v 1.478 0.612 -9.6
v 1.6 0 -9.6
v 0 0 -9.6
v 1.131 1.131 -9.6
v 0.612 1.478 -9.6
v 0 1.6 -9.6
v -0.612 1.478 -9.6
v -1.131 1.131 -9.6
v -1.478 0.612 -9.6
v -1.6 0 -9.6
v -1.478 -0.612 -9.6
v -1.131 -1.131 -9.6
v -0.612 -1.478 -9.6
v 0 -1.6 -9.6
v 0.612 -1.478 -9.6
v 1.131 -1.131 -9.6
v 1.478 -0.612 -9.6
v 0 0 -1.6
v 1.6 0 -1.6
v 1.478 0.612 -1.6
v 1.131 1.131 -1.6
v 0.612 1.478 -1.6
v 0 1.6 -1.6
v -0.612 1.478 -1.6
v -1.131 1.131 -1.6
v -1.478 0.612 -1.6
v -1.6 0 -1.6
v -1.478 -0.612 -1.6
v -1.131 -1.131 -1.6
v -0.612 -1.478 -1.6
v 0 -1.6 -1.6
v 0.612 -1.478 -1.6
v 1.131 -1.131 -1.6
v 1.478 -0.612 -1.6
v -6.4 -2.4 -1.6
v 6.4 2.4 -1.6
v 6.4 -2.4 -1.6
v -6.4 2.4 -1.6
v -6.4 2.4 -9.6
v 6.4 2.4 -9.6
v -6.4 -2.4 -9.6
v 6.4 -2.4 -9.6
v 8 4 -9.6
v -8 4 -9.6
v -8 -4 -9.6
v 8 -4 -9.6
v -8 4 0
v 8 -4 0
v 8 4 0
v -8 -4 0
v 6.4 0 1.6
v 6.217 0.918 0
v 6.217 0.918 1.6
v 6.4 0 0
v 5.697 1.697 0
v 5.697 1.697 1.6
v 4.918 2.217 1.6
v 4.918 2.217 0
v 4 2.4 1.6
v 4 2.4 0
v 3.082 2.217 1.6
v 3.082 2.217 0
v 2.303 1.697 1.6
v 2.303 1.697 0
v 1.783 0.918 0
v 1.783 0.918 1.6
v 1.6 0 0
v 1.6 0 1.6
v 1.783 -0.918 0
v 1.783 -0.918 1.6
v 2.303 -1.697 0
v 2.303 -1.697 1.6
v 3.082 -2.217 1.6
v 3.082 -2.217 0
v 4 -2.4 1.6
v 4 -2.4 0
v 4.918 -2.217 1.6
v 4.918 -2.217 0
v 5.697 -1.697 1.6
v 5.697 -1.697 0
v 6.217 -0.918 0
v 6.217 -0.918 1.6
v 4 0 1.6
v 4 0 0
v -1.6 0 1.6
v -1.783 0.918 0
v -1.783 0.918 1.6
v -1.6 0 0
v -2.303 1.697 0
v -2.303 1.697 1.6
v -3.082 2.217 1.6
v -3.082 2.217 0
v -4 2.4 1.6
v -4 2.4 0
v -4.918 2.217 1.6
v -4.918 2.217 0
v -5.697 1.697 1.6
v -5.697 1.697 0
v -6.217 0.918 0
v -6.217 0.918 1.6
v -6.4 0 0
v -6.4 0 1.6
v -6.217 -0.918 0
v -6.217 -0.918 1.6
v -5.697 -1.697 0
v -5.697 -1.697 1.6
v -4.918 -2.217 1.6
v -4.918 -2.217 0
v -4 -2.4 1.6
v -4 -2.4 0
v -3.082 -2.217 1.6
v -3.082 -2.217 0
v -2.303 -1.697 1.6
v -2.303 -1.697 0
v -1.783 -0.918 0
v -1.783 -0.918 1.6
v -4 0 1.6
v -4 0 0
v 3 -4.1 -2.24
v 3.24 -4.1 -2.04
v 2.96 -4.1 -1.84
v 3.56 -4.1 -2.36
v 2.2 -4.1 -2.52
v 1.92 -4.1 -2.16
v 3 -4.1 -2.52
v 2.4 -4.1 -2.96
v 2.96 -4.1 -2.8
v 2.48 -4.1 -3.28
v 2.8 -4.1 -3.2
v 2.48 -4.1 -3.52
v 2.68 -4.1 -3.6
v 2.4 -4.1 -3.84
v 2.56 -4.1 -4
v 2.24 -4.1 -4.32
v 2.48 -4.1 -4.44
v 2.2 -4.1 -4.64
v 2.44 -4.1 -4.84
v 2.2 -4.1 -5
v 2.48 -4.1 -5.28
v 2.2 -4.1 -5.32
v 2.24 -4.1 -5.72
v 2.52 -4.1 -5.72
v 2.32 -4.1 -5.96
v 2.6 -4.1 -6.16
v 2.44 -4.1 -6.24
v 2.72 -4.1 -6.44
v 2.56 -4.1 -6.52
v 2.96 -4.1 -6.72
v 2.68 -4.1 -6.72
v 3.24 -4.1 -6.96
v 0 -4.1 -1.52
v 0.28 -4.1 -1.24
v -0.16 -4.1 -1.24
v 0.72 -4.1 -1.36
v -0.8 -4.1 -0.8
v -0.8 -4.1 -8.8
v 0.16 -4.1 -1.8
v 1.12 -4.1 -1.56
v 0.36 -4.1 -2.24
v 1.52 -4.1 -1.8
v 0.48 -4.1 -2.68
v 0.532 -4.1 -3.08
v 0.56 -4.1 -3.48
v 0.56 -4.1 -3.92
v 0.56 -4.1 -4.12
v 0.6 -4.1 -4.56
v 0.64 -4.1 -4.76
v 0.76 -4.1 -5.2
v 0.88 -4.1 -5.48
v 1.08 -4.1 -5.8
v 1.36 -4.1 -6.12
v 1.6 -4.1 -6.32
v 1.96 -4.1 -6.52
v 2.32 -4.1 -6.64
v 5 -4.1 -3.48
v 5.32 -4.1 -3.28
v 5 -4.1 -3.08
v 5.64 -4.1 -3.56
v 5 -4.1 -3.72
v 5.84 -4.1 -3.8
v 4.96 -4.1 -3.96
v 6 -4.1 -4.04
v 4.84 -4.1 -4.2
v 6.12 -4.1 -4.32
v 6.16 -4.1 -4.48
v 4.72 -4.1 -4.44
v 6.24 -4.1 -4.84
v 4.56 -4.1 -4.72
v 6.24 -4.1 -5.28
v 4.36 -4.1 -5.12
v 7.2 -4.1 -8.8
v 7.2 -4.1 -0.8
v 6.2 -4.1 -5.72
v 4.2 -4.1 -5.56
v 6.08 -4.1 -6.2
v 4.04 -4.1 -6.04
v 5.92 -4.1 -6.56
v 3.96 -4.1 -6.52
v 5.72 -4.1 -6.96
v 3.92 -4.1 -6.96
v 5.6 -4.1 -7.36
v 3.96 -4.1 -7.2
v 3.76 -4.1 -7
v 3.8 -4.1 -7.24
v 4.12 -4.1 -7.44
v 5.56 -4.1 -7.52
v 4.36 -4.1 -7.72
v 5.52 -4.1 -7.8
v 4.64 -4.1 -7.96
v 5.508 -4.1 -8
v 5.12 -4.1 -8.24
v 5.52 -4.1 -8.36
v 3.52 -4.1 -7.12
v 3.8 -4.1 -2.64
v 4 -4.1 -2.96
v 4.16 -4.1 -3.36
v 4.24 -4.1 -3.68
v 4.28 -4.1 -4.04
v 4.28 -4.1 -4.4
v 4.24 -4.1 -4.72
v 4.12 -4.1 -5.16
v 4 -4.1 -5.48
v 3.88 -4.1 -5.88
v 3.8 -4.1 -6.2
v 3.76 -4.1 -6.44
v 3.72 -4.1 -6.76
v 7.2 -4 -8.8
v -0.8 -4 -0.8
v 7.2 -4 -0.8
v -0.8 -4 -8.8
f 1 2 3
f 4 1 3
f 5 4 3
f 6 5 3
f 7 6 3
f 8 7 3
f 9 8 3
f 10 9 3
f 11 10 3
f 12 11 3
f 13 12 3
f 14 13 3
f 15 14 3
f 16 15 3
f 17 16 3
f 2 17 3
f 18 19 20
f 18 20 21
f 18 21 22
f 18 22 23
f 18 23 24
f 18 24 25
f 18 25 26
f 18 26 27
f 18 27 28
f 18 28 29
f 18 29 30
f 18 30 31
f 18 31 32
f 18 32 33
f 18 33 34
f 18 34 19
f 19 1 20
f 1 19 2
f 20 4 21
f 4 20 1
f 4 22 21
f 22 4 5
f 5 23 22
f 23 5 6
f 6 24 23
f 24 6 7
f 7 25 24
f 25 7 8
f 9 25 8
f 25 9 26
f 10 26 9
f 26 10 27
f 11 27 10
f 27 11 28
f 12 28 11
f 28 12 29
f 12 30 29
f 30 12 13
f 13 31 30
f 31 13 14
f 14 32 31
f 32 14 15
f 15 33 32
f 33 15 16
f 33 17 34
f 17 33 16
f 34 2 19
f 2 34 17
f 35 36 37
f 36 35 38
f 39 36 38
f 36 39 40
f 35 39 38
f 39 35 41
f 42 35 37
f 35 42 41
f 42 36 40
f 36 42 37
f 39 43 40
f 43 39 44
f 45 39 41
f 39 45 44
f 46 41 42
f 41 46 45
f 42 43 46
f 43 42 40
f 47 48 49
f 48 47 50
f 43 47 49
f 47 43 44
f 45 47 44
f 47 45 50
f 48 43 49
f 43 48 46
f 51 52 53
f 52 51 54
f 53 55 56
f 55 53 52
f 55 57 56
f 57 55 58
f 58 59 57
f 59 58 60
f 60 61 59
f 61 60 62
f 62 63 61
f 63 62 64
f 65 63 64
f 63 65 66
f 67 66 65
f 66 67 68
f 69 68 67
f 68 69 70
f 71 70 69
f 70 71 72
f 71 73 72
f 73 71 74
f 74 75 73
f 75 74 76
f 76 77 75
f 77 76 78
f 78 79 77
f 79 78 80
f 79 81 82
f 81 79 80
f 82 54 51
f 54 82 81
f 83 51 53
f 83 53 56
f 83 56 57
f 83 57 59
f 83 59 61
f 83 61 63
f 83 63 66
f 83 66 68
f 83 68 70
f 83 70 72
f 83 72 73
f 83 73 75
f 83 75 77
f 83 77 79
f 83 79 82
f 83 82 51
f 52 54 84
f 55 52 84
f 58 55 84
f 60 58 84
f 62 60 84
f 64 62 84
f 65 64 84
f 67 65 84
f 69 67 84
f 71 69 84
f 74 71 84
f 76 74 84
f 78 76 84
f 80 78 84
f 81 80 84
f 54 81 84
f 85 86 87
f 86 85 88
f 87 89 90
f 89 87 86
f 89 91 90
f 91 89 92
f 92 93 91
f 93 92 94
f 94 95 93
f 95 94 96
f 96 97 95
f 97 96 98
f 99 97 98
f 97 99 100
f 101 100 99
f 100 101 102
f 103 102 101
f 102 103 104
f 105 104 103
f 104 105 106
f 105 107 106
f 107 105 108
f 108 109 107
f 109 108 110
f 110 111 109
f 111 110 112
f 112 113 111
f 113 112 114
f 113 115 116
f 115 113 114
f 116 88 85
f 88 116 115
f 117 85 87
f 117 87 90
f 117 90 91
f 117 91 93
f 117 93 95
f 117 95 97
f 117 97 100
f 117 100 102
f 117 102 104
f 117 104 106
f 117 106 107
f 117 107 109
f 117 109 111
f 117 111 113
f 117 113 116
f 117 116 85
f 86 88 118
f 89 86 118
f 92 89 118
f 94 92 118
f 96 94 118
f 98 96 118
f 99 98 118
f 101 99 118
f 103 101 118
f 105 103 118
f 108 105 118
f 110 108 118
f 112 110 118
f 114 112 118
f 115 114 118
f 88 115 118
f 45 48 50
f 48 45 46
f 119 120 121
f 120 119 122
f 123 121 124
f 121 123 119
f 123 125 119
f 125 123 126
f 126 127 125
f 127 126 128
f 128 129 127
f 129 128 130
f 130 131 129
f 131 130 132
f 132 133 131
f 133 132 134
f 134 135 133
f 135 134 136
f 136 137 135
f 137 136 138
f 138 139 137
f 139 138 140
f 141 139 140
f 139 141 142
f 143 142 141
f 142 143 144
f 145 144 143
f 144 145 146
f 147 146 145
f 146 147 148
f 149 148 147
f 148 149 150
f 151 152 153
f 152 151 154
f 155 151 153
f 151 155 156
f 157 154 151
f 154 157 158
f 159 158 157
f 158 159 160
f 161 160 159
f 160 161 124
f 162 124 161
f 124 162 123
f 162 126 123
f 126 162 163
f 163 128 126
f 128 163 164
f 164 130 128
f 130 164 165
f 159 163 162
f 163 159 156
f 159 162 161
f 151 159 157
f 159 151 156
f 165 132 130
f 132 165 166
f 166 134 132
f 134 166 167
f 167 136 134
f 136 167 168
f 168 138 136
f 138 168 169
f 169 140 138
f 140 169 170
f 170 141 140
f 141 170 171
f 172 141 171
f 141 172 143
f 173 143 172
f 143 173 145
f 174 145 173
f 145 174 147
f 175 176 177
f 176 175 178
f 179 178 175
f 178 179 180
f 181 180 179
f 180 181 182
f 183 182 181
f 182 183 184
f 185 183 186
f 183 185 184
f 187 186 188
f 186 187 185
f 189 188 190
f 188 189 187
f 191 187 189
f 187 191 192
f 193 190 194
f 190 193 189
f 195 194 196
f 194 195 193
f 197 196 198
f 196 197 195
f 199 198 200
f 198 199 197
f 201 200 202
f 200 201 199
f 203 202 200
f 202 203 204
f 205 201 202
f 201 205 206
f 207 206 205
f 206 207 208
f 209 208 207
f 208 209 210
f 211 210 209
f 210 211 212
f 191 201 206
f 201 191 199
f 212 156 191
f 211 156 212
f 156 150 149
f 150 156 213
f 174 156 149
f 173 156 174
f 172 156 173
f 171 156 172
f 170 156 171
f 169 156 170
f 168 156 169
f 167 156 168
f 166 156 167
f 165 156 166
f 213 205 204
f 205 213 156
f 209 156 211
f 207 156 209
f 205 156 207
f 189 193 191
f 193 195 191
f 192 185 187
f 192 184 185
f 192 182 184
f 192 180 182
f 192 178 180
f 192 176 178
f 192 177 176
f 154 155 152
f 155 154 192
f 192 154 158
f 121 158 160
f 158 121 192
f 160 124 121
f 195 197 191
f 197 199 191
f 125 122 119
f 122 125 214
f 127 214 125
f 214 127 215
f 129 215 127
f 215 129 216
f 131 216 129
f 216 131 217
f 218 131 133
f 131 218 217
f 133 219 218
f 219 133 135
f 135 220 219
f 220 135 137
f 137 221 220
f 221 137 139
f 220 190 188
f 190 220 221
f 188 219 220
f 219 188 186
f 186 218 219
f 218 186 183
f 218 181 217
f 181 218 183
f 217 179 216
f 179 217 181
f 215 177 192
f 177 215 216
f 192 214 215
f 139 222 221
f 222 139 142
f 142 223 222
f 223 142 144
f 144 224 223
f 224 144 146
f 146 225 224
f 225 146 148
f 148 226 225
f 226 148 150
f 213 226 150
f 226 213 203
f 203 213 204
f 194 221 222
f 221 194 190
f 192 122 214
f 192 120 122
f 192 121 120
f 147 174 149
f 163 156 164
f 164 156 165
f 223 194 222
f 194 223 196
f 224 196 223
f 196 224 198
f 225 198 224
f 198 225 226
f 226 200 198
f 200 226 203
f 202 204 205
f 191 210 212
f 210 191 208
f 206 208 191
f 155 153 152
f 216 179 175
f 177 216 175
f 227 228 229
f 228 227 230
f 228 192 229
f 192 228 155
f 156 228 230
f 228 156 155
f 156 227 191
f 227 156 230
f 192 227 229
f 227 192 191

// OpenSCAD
// file: ../p/4-4edge.scad
use <../lib.scad>
function ldraw_lib__4_4edge() = [
// 0 Circle 1.0
// 0 Name: 4-4edge.dat
// 0 Author: James Jessiman
// 0 !LDRAW_ORG Primitive UPDATE 2017-01
// 0 !LICENSE Licensed under CC BY 2.0 and CC BY 4.0 : see CAreadme.txt
// 
// 0 BFC CERTIFY CCW
  [0,"BFC","CERTIFY"],
  [0,"BFC","CCW"],
// 
// 0 !HISTORY 1998-12-15 [PTadmin] Official Update 1998-10
// 0 !HISTORY 2005-12-28 [PTadmin] Official Update 2005-01
// 0 !HISTORY 2007-06-24 [PTadmin] Header formatted for Contributor Agreement
// 0 !HISTORY 2008-07-01 [PTadmin] Official Update 2008-01
// 0 !HISTORY 2017-01-15 [Steffen] BFCed
// 0 !HISTORY 2017-12-30 [PTadmin] Official Update 2017-01
// 
// 
// 2 24 1 0 0 0.9239 0 0.3827
  [2,24,1,0,0,0.9239,0,0.3827],
// 2 24 0.9239 0 0.3827 0.7071 0 0.7071
  [2,24,0.9239,0,0.3827,0.7071,0,0.7071],
// 2 24 0.7071 0 0.7071 0.3827 0 0.9239
  [2,24,0.7071,0,0.7071,0.3827,0,0.9239],
// 2 24 0.3827 0 0.9239 0 0 1
  [2,24,0.3827,0,0.9239,0,0,1],
// 2 24 0 0 1 -0.3827 0 0.9239
  [2,24,0,0,1,-0.3827,0,0.9239],
// 2 24 -0.3827 0 0.9239 -0.7071 0 0.7071
  [2,24,-0.3827,0,0.9239,-0.7071,0,0.7071],
// 2 24 -0.7071 0 0.7071 -0.9239 0 0.3827
  [2,24,-0.7071,0,0.7071,-0.9239,0,0.3827],
// 2 24 -0.9239 0 0.3827 -1 0 -0
  [2,24,-0.9239,0,0.3827,-1,0,-0],
// 2 24 -1 0 -0 -0.9239 0 -0.3827
  [2,24,-1,0,-0,-0.9239,0,-0.3827],
// 2 24 -0.9239 0 -0.3827 -0.7071 0 -0.7071
  [2,24,-0.9239,0,-0.3827,-0.7071,0,-0.7071],
// 2 24 -0.7071 0 -0.7071 -0.3827 0 -0.9239
  [2,24,-0.7071,0,-0.7071,-0.3827,0,-0.9239],
// 2 24 -0.3827 0 -0.9239 0 0 -1
  [2,24,-0.3827,0,-0.9239,0,0,-1],
// 2 24 0 0 -1 0.3827 0 -0.9239
  [2,24,0,0,-1,0.3827,0,-0.9239],
// 2 24 0.3827 0 -0.9239 0.7071 0 -0.7071
  [2,24,0.3827,0,-0.9239,0.7071,0,-0.7071],
// 2 24 0.7071 0 -0.7071 0.9239 0 -0.3827
  [2,24,0.7071,0,-0.7071,0.9239,0,-0.3827],
// 2 24 0.9239 0 -0.3827 1 0 0
  [2,24,0.9239,0,-0.3827,1,0,0],
];
module ldraw_lib__4_4edge(step=0, col=false, unit=2/5, alt=false, line=0.2, solid=!$preview)
    makepoly(ldraw_lib__4_4edge(), step=step, col=col, unit=unit, alt=alt, line=line, solid=solid);
ldraw_lib__4_4edge(line=0.2);
// file: ../p/4-4disc.scad
use <../lib.scad>
function ldraw_lib__4_4disc() = [
// 0 Disc 1.0
// 0 Name: 4-4disc.dat
// 0 Author: James Jessiman
// 0 !LDRAW_ORG Primitive UPDATE 2002-02
// 0 !LICENSE Licensed under CC BY 2.0 and CC BY 4.0 : see CAreadme.txt
// 
// 0 BFC CERTIFY CCW
  [0,"BFC","CERTIFY"],
  [0,"BFC","CCW"],
// 
// 0 !HISTORY 1998-12-15 [PTadmin] Official Update 1998-10
// 0 !HISTORY 2002-03-23 [sbliss] Added BFC statement
// 0 !HISTORY 2002-04-25 [PTadmin] Official Update 2002-02
// 0 !HISTORY 2007-06-24 [PTadmin] Header formatted for Contributor Agreement
// 0 !HISTORY 2008-07-01 [PTadmin] Official Update 2008-01
// 
// 
// 3 16 0 0 0 1 0 0 0.9239 0 0.3827
  [3,16,0,0,0,1,0,0,0.9239,0,0.3827],
// 3 16 0 0 0 0.9239 0 0.3827 0.7071 0 0.7071
  [3,16,0,0,0,0.9239,0,0.3827,0.7071,0,0.7071],
// 3 16 0 0 0 0.7071 0 0.7071 0.3827 0 0.9239
  [3,16,0,0,0,0.7071,0,0.7071,0.3827,0,0.9239],
// 3 16 0 0 0 0.3827 0 0.9239 0 0 1
  [3,16,0,0,0,0.3827,0,0.9239,0,0,1],
// 3 16 0 0 0 0 0 1 -0.3827 0 0.9239
  [3,16,0,0,0,0,0,1,-0.3827,0,0.9239],
// 3 16 0 0 0 -0.3827 0 0.9239 -0.7071 0 0.7071
  [3,16,0,0,0,-0.3827,0,0.9239,-0.7071,0,0.7071],
// 3 16 0 0 0 -0.7071 0 0.7071 -0.9239 0 0.3827
  [3,16,0,0,0,-0.7071,0,0.7071,-0.9239,0,0.3827],
// 3 16 0 0 0 -0.9239 0 0.3827 -1 0 -0
  [3,16,0,0,0,-0.9239,0,0.3827,-1,0,-0],
// 3 16 0 0 0 -1 0 -0 -0.9239 0 -0.3827
  [3,16,0,0,0,-1,0,-0,-0.9239,0,-0.3827],
// 3 16 0 0 0 -0.9239 0 -0.3827 -0.7071 0 -0.7071
  [3,16,0,0,0,-0.9239,0,-0.3827,-0.7071,0,-0.7071],
// 3 16 0 0 0 -0.7071 0 -0.7071 -0.3827 0 -0.9239
  [3,16,0,0,0,-0.7071,0,-0.7071,-0.3827,0,-0.9239],
// 3 16 0 0 0 -0.3827 0 -0.9239 0 0 -1
  [3,16,0,0,0,-0.3827,0,-0.9239,0,0,-1],
// 3 16 0 0 0 0 0 -1 0.3827 0 -0.9239
  [3,16,0,0,0,0,0,-1,0.3827,0,-0.9239],
// 3 16 0 0 0 0.3827 0 -0.9239 0.7071 0 -0.7071
  [3,16,0,0,0,0.3827,0,-0.9239,0.7071,0,-0.7071],
// 3 16 0 0 0 0.7071 0 -0.7071 0.9239 0 -0.3827
  [3,16,0,0,0,0.7071,0,-0.7071,0.9239,0,-0.3827],
// 3 16 0 0 0 0.9239 0 -0.3827 1 0 0
  [3,16,0,0,0,0.9239,0,-0.3827,1,0,0],
// 0
];
module ldraw_lib__4_4disc(step=0, col=false, unit=2/5, alt=false, line=0.2, solid=!$preview)
    makepoly(ldraw_lib__4_4disc(), step=step, col=col, unit=unit, alt=alt, line=line, solid=solid);
ldraw_lib__4_4disc(line=0.2);
// file: ../p/4-4cyli.scad
use <../lib.scad>
$fa=1; $fs=0.2;
function ldraw_lib__4_4cyli(realsolid=false) = [
// 0 Cylinder 1.0
// 0 Name: 4-4cyli.dat
// 0 Author: James Jessiman
// 0 !LDRAW_ORG Primitive UPDATE 2005-01
// 0 !LICENSE Licensed under CC BY 2.0 and CC BY 4.0 : see CAreadme.txt
// 
// 0 BFC CERTIFY CCW
  [0,"BFC","CERTIFY"],
  [0,"BFC","CCW"],
// 
// 0 !HISTORY 1998-12-15 [PTadmin] Official Update 1998-10
// 0 !HISTORY 2002-03-23 [sbliss] Added BFC statement; merged headers from files in distributions LDraw 0.27 and Complete.
// 0 !HISTORY 2002-04-25 [PTadmin] Official Update 2002-02
// 0 !HISTORY 2004-12-14 [guyvivan] BFC CCW
// 0 !HISTORY 2005-12-28 [PTadmin] Official Update 2005-01
// 0 !HISTORY 2007-06-24 [PTadmin] Header formatted for Contributor Agreement
// 0 !HISTORY 2008-07-01 [PTadmin] Official Update 2008-01
// 
// 
// 4 16 1 1 0 0.9239 1 0.3827 0.9239 0 0.3827 1 0 0
  [4,16,1,1,0,0.9239,1,0.3827,0.9239,0,0.3827,1,0,0],
// 5 24 1 0 0 1 1 0 0.9239 0 0.3827 0.9239 0 -0.3827
  [5,24,1,0,0,1,1,0,0.9239,0,0.3827,0.9239,0,-0.3827],
// 4 16 0.9239 1 0.3827 0.7071 1 0.7071 0.7071 0 0.7071 0.9239 0 0.3827
  [4,16,0.9239,1,0.3827,0.7071,1,0.7071,0.7071,0,0.7071,0.9239,0,0.3827],
// 5 24 0.9239 0 0.3827 0.9239 1 0.3827 0.7071 0 0.7071 1 0 0
  [5,24,0.9239,0,0.3827,0.9239,1,0.3827,0.7071,0,0.7071,1,0,0],
// 4 16 0.7071 1 0.7071 0.3827 1 0.9239 0.3827 0 0.9239 0.7071 0 0.7071
  [4,16,0.7071,1,0.7071,0.3827,1,0.9239,0.3827,0,0.9239,0.7071,0,0.7071],
// 5 24 0.7071 0 0.7071 0.7071 1 0.7071 0.3827 0 0.9239 0.9239 0 0.3827
  [5,24,0.7071,0,0.7071,0.7071,1,0.7071,0.3827,0,0.9239,0.9239,0,0.3827],
// 4 16 0.3827 1 0.9239 0 1 1 0 0 1 0.3827 0 0.9239
  [4,16,0.3827,1,0.9239,0,1,1,0,0,1,0.3827,0,0.9239],
// 5 24 0.3827 0 0.9239 0.3827 1 0.9239 0 0 1 0.7071 0 0.7071
  [5,24,0.3827,0,0.9239,0.3827,1,0.9239,0,0,1,0.7071,0,0.7071],
// 4 16 0 1 1 -0.3827 1 0.9239 -0.3827 0 0.9239 0 0 1
  [4,16,0,1,1,-0.3827,1,0.9239,-0.3827,0,0.9239,0,0,1],
// 5 24 0 0 1 0 1 1 -0.3827 0 0.9239 0.3827 0 0.9239
  [5,24,0,0,1,0,1,1,-0.3827,0,0.9239,0.3827,0,0.9239],
// 4 16 -0.3827 1 0.9239 -0.7071 1 0.7071 -0.7071 0 0.7071 -0.3827 0 0.9239
  [4,16,-0.3827,1,0.9239,-0.7071,1,0.7071,-0.7071,0,0.7071,-0.3827,0,0.9239],
// 5 24 -0.3827 0 0.9239 -0.3827 1 0.9239 -0.7071 0 0.7071 0 0 1
  [5,24,-0.3827,0,0.9239,-0.3827,1,0.9239,-0.7071,0,0.7071,0,0,1],
// 4 16 -0.7071 1 0.7071 -0.9239 1 0.3827 -0.9239 0 0.3827 -0.7071 0 0.7071
  [4,16,-0.7071,1,0.7071,-0.9239,1,0.3827,-0.9239,0,0.3827,-0.7071,0,0.7071],
// 5 24 -0.7071 0 0.7071 -0.7071 1 0.7071 -0.9239 0 0.3827 -0.3827 0 0.9239
  [5,24,-0.7071,0,0.7071,-0.7071,1,0.7071,-0.9239,0,0.3827,-0.3827,0,0.9239],
// 4 16 -0.9239 1 0.3827 -1 1 0 -1 0 0 -0.9239 0 0.3827
  [4,16,-0.9239,1,0.3827,-1,1,0,-1,0,0,-0.9239,0,0.3827],
// 5 24 -0.9239 0 0.3827 -0.9239 1 0.3827 -1 0 0 -0.7071 0 0.7071
  [5,24,-0.9239,0,0.3827,-0.9239,1,0.3827,-1,0,0,-0.7071,0,0.7071],
// 4 16 -1 1 0 -0.9239 1 -0.3827 -0.9239 0 -0.3827 -1 0 0
  [4,16,-1,1,0,-0.9239,1,-0.3827,-0.9239,0,-0.3827,-1,0,0],
// 5 24 -1 0 0 -1 1 0 -0.9239 0 -0.3827 -0.9239 0 0.3827
  [5,24,-1,0,0,-1,1,0,-0.9239,0,-0.3827,-0.9239,0,0.3827],
// 4 16 -0.9239 1 -0.3827 -0.7071 1 -0.7071 -0.7071 0 -0.7071 -0.9239 0 -0.3827
  [4,16,-0.9239,1,-0.3827,-0.7071,1,-0.7071,-0.7071,0,-0.7071,-0.9239,0,-0.3827],
// 5 24 -0.9239 0 -0.3827 -0.9239 1 -0.3827 -0.7071 0 -0.7071 -1 0 0
  [5,24,-0.9239,0,-0.3827,-0.9239,1,-0.3827,-0.7071,0,-0.7071,-1,0,0],
// 4 16 -0.7071 1 -0.7071 -0.3827 1 -0.9239 -0.3827 0 -0.9239 -0.7071 0 -0.7071
  [4,16,-0.7071,1,-0.7071,-0.3827,1,-0.9239,-0.3827,0,-0.9239,-0.7071,0,-0.7071],
// 5 24 -0.7071 0 -0.7071 -0.7071 1 -0.7071 -0.3827 0 -0.9239 -0.9239 0 -0.3827
  [5,24,-0.7071,0,-0.7071,-0.7071,1,-0.7071,-0.3827,0,-0.9239,-0.9239,0,-0.3827],
// 4 16 -0.3827 1 -0.9239 0 1 -1 0 0 -1 -0.3827 0 -0.9239
  [4,16,-0.3827,1,-0.9239,0,1,-1,0,0,-1,-0.3827,0,-0.9239],
// 5 24 -0.3827 0 -0.9239 -0.3827 1 -0.9239 0 0 -1 -0.7071 0 -0.7071
  [5,24,-0.3827,0,-0.9239,-0.3827,1,-0.9239,0,0,-1,-0.7071,0,-0.7071],
// 4 16 0 1 -1 0.3827 1 -0.9239 0.3827 0 -0.9239 0 0 -1
  [4,16,0,1,-1,0.3827,1,-0.9239,0.3827,0,-0.9239,0,0,-1],
// 5 24 0 0 -1 0 1 -1 0.3827 0 -0.9239 -0.3827 0 -0.9239
  [5,24,0,0,-1,0,1,-1,0.3827,0,-0.9239,-0.3827,0,-0.9239],
// 4 16 0.3827 1 -0.9239 0.7071 1 -0.7071 0.7071 0 -0.7071 0.3827 0 -0.9239
  [4,16,0.3827,1,-0.9239,0.7071,1,-0.7071,0.7071,0,-0.7071,0.3827,0,-0.9239],
// 5 24 0.3827 0 -0.9239 0.3827 1 -0.9239 0.7071 0 -0.7071 0 0 -1
  [5,24,0.3827,0,-0.9239,0.3827,1,-0.9239,0.7071,0,-0.7071,0,0,-1],
// 4 16 0.7071 1 -0.7071 0.9239 1 -0.3827 0.9239 0 -0.3827 0.7071 0 -0.7071
  [4,16,0.7071,1,-0.7071,0.9239,1,-0.3827,0.9239,0,-0.3827,0.7071,0,-0.7071],
// 5 24 0.7071 0 -0.7071 0.7071 1 -0.7071 0.9239 0 -0.3827 0.3827 0 -0.9239
  [5,24,0.7071,0,-0.7071,0.7071,1,-0.7071,0.9239,0,-0.3827,0.3827,0,-0.9239],
// 4 16 0.9239 1 -0.3827 1 1 0 1 0 0 0.9239 0 -0.3827
  [4,16,0.9239,1,-0.3827,1,1,0,1,0,0,0.9239,0,-0.3827],
// 5 24 0.9239 0 -0.3827 0.9239 1 -0.3827 1 0 0 0.7071 0 -0.7071
  [5,24,0.9239,0,-0.3827,0.9239,1,-0.3827,1,0,0,0.7071,0,-0.7071],
// 0
];
module ldraw_lib__4_4cyli(step=0, col=false, unit=2/5, alt=false, line=0.2, solid=!$preview)
    makepoly(ldraw_lib__4_4cyli(solid), step=step, col=col, unit=unit, alt=alt, line=line, solid=solid);
ldraw_lib__4_4cyli(line=0.2);
// file: ../p/stud3.scad
use <../lib.scad>
use <4-4cyli.scad>
use <4-4disc.scad>
use <4-4edge.scad>
function ldraw_lib__stud3() = [
// 0 Stud Tube Solid
// 0 Name: stud3.dat
// 0 Author: James Jessiman
// 0 !LDRAW_ORG Primitive UPDATE 2012-01
// 0 !LICENSE Licensed under CC BY 4.0 : see CAreadme.txt
// 
// 0 BFC CERTIFY CCW
  [0,"BFC","CERTIFY"],
  [0,"BFC","CCW"],
// 
// 0 !HISTORY 2002-04-04 [sbliss] Modified for BFC compliance
// 0 !HISTORY 2002-04-25 [PTadmin] Official Update 2002-02
// 0 !HISTORY 2007-06-24 [PTadmin] Header formatted for Contributor Agreement
// 0 !HISTORY 2008-07-01 [PTadmin] Official Update 2008-01
// 0 !HISTORY 2012-02-16 [Philo] Changed to CCW
// 0 !HISTORY 2012-03-30 [PTadmin] Official Update 2012-01
// 
// 
// 1 16 0 -4 0 4 0 0 0 1 0 0 0 4 4-4edge.dat
  [1,16,0,-4,0,4,0,0,0,1,0,0,0,4, ldraw_lib__4_4edge()],
// 1 16 0 0 0 4 0 0 0 1 0 0 0 4 4-4edge.dat
  [1,16,0,0,0,4,0,0,0,1,0,0,0,4, ldraw_lib__4_4edge()],
// 1 16 0 -4 0 4 0 0 0 1 0 0 0 4 4-4disc.dat
  [1,16,0,-4,0,4,0,0,0,1,0,0,0,4, ldraw_lib__4_4disc()],
  [-1,16,0,0,0,4,0,0,0,-1,0,0,0,4, ldraw_lib__4_4disc()],
// 1 16 0 -4 0 4 0 0 0 4 0 0 0 4 4-4cyli.dat
  [1,16,0,-4,0,4,0,0,0,4,0,0,0,4, ldraw_lib__4_4cyli()],
];
module ldraw_lib__stud3(step=0, col=false, unit=2/5, alt=false, line=0.2, solid=!$preview)
    makepoly(ldraw_lib__stud3(), step=step, col=col, unit=unit, alt=alt, line=line, solid=solid);
ldraw_lib__stud3(line=0.2);
// file: ../p/stud.scad
use <../lib.scad>
use <4-4cyli.scad>
use <4-4disc.scad>
use <4-4edge.scad>
function ldraw_lib__stud() = [
// 0 Stud
// 0 Name: stud.dat
// 0 Author: James Jessiman
// 0 !LDRAW_ORG Primitive UPDATE 2012-01
// 0 !LICENSE Licensed under CC BY 4.0 : see CAreadme.txt
// 
// 0 BFC CERTIFY CCW
  [0,"BFC","CERTIFY"],
  [0,"BFC","CCW"],
// 
// 0 !HISTORY 2002-04-04 [sbliss] Modified for BFC compliance
// 0 !HISTORY 2002-04-25 [PTadmin] Official Update 2002-02
// 0 !HISTORY 2007-06-24 [PTadmin] Header formatted for Contributor Agreement
// 0 !HISTORY 2008-07-01 [PTadmin] Official Update 2008-01
// 0 !HISTORY 2012-02-16 [Philo] Changed to CCW
// 0 !HISTORY 2012-03-30 [PTadmin] Official Update 2012-01
// 
// 
// 1 16 0 0 0 6 0 0 0 1 0 0 0 6 4-4edge.dat
  [1,16,0,0,0,6,0,0,0,1,0,0,0,6, ldraw_lib__4_4edge()],
// 1 16 0 -4 0 6 0 0 0 1 0 0 0 6 4-4edge.dat
  [1,16,0,-4,0,6,0,0,0,1,0,0,0,6, ldraw_lib__4_4edge()],
// 1 16 0 0 0 6 0 0 0 -4 0 0 0 6 4-4cyli.dat
  [1,16,0,0,0,6,0,0,0,-4,0,0,0,6, ldraw_lib__4_4cyli()],
// 1 16 0 -4 0 6 0 0 0 1 0 0 0 6 4-4disc.dat
  [1,16,0,-4,0,6,0,0,0,1,0,0,0,6, ldraw_lib__4_4disc()],
  [-1,16,0,0,0,6,0,0,0,-1,0,0,0,6, ldraw_lib__4_4disc()],
];
module ldraw_lib__stud(step=0, col=false, unit=2/5, alt=false, line=0.2, solid=!$preview)
    makepoly(ldraw_lib__stud(), step=step, col=col, unit=unit, alt=alt, line=line, solid=solid);
ldraw_lib__stud(line=0.2);
// file: ../p/box5.scad
use <../lib.scad>
function ldraw_lib__box5() = [
// 0 Box with 5 Faces and All Edges
// 0 Name: box5.dat
// 0 Author: James Jessiman
// 0 !LDRAW_ORG Primitive UPDATE 2012-01
// 0 !LICENSE Licensed under CC BY 2.0 and CC BY 4.0 : see CAreadme.txt
// 
// 0 BFC CERTIFY CCW
  [0,"BFC","CERTIFY"],
  [0,"BFC","CCW"],
// 
// 0 !HISTORY 2002-04-03 [sbliss] Modified for BFC compliance
// 0 !HISTORY 2002-04-25 [PTadmin] Official Update 2002-02
// 0 !HISTORY 2007-06-24 [PTadmin] Header formatted for Contributor Agreement
// 0 !HISTORY 2008-07-01 [PTadmin] Official Update 2008-01
// 0 !HISTORY 2012-02-16 [Philo] Changed to CCW
// 0 !HISTORY 2012-03-30 [PTadmin] Official Update 2012-01
// 
// 
// 2 24 1 1 1 -1 1 1
  [2,24,1,1,1,-1,1,1],
// 2 24 -1 1 1 -1 1 -1
  [2,24,-1,1,1,-1,1,-1],
// 2 24 -1 1 -1 1 1 -1
  [2,24,-1,1,-1,1,1,-1],
// 2 24 1 1 -1 1 1 1
  [2,24,1,1,-1,1,1,1],
// 2 24 1 0 1 -1 0 1
  [2,24,1,0,1,-1,0,1],
// 2 24 -1 0 1 -1 0 -1
  [2,24,-1,0,1,-1,0,-1],
// 2 24 -1 0 -1 1 0 -1
  [2,24,-1,0,-1,1,0,-1],
// 2 24 1 0 -1 1 0 1
  [2,24,1,0,-1,1,0,1],
// 2 24 1 0 1 1 1 1
  [2,24,1,0,1,1,1,1],
// 2 24 -1 0 1 -1 1 1
  [2,24,-1,0,1,-1,1,1],
// 2 24 1 0 -1 1 1 -1
  [2,24,1,0,-1,1,1,-1],
// 2 24 -1 0 -1 -1 1 -1
  [2,24,-1,0,-1,-1,1,-1],
// 4 16 -1 1 1 1 1 1 1 1 -1 -1 1 -1
  [4,16,-1,1,1,1,1,1,1,1,-1,-1,1,-1],
// 4 16 -1 1 1 -1 0 1 1 0 1 1 1 1
  [4,16,-1,1,1,-1,0,1,1,0,1,1,1,1],
// 4 16 -1 1 -1 -1 0 -1 -1 0 1 -1 1 1
  [4,16,-1,1,-1,-1,0,-1,-1,0,1,-1,1,1],
// 4 16 1 1 -1 1 0 -1 -1 0 -1 -1 1 -1
  [4,16,1,1,-1,1,0,-1,-1,0,-1,-1,1,-1],
// 4 16 1 1 1 1 0 1 1 0 -1 1 1 -1
  [4,16,1,1,1,1,0,1,1,0,-1,1,1,-1],
];
makepoly(ldraw_lib__box5(), line=0.2);
// file: ../p/box4t.scad
use <../lib.scad>
function ldraw_lib__box4t() = [
// 0 Box with 4 Adjacent Faces and All Edges
// 0 Name: box4t.dat
// 0 Author: Tore Eriksson [Tore_Eriksson]
// 0 !LDRAW_ORG Primitive UPDATE 2003-02
// 0 !LICENSE Licensed under CC BY 2.0 and CC BY 4.0 : see CAreadme.txt
// 
// 0 BFC CERTIFY CCW
  [0,"BFC","CERTIFY"],
  [0,"BFC","CCW"],
// 
// 0 !HISTORY 1997-09-29 [PTadmin] Official Update 1997-15
// 0 !HISTORY 2002-08-31 [izanette] Modified with WINDZ for BFC compliance
// 0 !HISTORY 2003-08-01 [PTadmin] Official Update 2003-02
// 0 !HISTORY 2007-06-24 [PTadmin] Header formatted for Contributor Agreement
// 0 !HISTORY 2008-07-01 [PTadmin] Official Update 2008-01
// 
// 
// 2 24 1 1 1 -1 1 1
  [2,24,1,1,1,-1,1,1],
// 2 24 -1 1 1 -1 1 -1
  [2,24,-1,1,1,-1,1,-1],
// 2 24 -1 1 -1 1 1 -1
  [2,24,-1,1,-1,1,1,-1],
// 2 24 1 1 -1 1 1 1
  [2,24,1,1,-1,1,1,1],
// 2 24 1 0 1 -1 0 1
  [2,24,1,0,1,-1,0,1],
// 2 24 -1 0 1 -1 0 -1
  [2,24,-1,0,1,-1,0,-1],
// 2 24 -1 0 -1 1 0 -1
  [2,24,-1,0,-1,1,0,-1],
// 2 24 1 0 -1 1 0 1
  [2,24,1,0,-1,1,0,1],
// 2 24 1 0 1 1 1 1
  [2,24,1,0,1,1,1,1],
// 2 24 -1 0 1 -1 1 1
  [2,24,-1,0,1,-1,1,1],
// 2 24 1 0 -1 1 1 -1
  [2,24,1,0,-1,1,1,-1],
// 2 24 -1 0 -1 -1 1 -1
  [2,24,-1,0,-1,-1,1,-1],
// 4 16 1 1 1 1 1 -1 -1 1 -1 -1 1 1
  [4,16,1,1,1,1,1,-1,-1,1,-1,-1,1,1],
// 4 16 1 1 1 -1 1 1 -1 0 1 1 0 1
  [4,16,1,1,1,-1,1,1,-1,0,1,1,0,1],
// 4 16 -1 1 1 -1 1 -1 -1 0 -1 -1 0 1
  [4,16,-1,1,1,-1,1,-1,-1,0,-1,-1,0,1],
// 0 4 16 -1 1 -1 -1 0 -1 1 0 -1 1 1 -1
// 4 16 1 1 -1 1 1 1 1 0 1 1 0 -1
  [4,16,1,1,-1,1,1,1,1,0,1,1,0,-1],
// 0
];
makepoly(ldraw_lib__box4t(), line=0.2);
// file: ../p/box5-12.scad
use <../lib.scad>
function ldraw_lib__box5_12() = [
// 0 Box with 5 Faces without Any Edges
// 0 Name: box5-12.dat
// 0 Author: Chris Dee [cwdee]
// 0 !LDRAW_ORG Primitive UPDATE 2009-02
// 0 !LICENSE Licensed under CC BY 2.0 and CC BY 4.0 : see CAreadme.txt
// 
// 0 BFC CERTIFY CCW
  [0,"BFC","CERTIFY"],
  [0,"BFC","CCW"],
// 
// 0 !HISTORY 2009-09-03 [PTadmin] Official Update 2009-02
// 
// 
// 4 16 1 1 1 1 1 -1 -1 1 -1 -1 1 1
  [4,16,1,1,1,1,1,-1,-1,1,-1,-1,1,1],
// 4 16 -1 0 1 1 0 1 1 1 1 -1 1 1
  [4,16,-1,0,1,1,0,1,1,1,1,-1,1,1],
// 4 16 -1 0 -1 -1 0 1 -1 1 1 -1 1 -1
  [4,16,-1,0,-1,-1,0,1,-1,1,1,-1,1,-1],
// 4 16 1 0 -1 -1 0 -1 -1 1 -1 1 1 -1
  [4,16,1,0,-1,-1,0,-1,-1,1,-1,1,1,-1],
// 4 16 1 0 1 1 0 -1 1 1 -1 1 1 1
  [4,16,1,0,1,1,0,-1,1,1,-1,1,1,1],
// 0
];
module ldraw_lib__box5_12(step=0, col=false, unit=2/5, alt=false, line=0.2, solid=!$preview)
    makepoly(ldraw_lib__box5_12(), step=step, col=col, unit=unit, alt=alt, line=line, solid=solid);
ldraw_lib__box5_12(line=0.2);
// file: s/3004s01.scad
use <../../lib.scad>
use <../../p/box4t.scad>
use <../../p/box5.scad>
use <../../p/stud.scad>
use <../../p/stud3.scad>
$fa=1; $fs=0.2;
function ldraw_lib__s__3004s01(realsolid=false) = [
// 0 ~Brick  1 x  2 without Front Face
// 0 Name: s\3004s01.dat
// 0 Author: James Jessiman
// 0 !LDRAW_ORG Subpart UPDATE 2003-03
// 0 !LICENSE Licensed under CC BY 2.0 and CC BY 4.0 : see CAreadme.txt
// 
// 0 BFC CERTIFY CCW
  [0,"BFC","CERTIFY"],
  [0,"BFC","CCW"],
// 
// 0 !HISTORY 2003-09-07 [jriley] Subfiling, BFC
// 0 !HISTORY 2003-12-19 [PTadmin] Official Update 2003-03
// 0 !HISTORY 2007-08-29 [PTadmin] Header formatted for Contributor Agreement
// 0 !HISTORY 2008-07-01 [PTadmin] Official Update 2008-01
// 
// 
// 1 16 0 4 0 1 0 0 0 -5 0 0 0 1 stud3.dat
  [1,16,0,4,0,1,0,0,0,-5,0,0,0,1, ldraw_lib__stud3(realsolid)],
// 0 BFC INVERTNEXT
  [0,"BFC","INVERTNEXT"],
// 1 16 0 24 0 16 0 0 0 -20 0 0 0 6 box5.dat
  [1,16,0,24,0,16,0,0,0,-20,0,0,0,6, ldraw_lib__box5(realsolid)],
// 4 16 20 24 10 16 24 6 -16 24 6 -20 24 10
  [4,16,20,24,10,16,24,6,-16,24,6,-20,24,10],
// 4 16 -20 24 10 -16 24 6 -16 24 -6 -20 24 -10
  [4,16,-20,24,10,-16,24,6,-16,24,-6,-20,24,-10],
// 4 16 -20 24 -10 -16 24 -6 16 24 -6 20 24 -10
  [4,16,-20,24,-10,-16,24,-6,16,24,-6,20,24,-10],
// 4 16 20 24 -10 16 24 -6 16 24 6 20 24 10
  [4,16,20,24,-10,16,24,-6,16,24,6,20,24,10],
// 1 16 0 24 0 20 0 0 0 -24 0 0 0 10 box4t.dat
  [1,16,0,24,0,20,0,0,0,-24,0,0,0,10, ldraw_lib__box4t(realsolid)],
// 1 16 10 0 0 1 0 0 0 1 0 0 0 1 stud.dat
  [1,16,10,0,0,1,0,0,0,1,0,0,0,1, ldraw_lib__stud(realsolid)],
// 1 16 -10 0 0 1 0 0 0 1 0 0 0 1 stud.dat
  [1,16,-10,0,0,1,0,0,0,1,0,0,0,1, ldraw_lib__stud(realsolid)],
// 0
];
module ldraw_lib__s__3004s01(step=0, col=false, unit=2/5, alt=false, line=0.2, solid=!$preview)
    makepoly(ldraw_lib__s__3004s01(solid), step=step, col=col, unit=unit, alt=alt, line=line, solid=solid);
ldraw_lib__s__3004s01(line=0.2);
// file: 004659a.scad
use <../lib.scad>
use <../p/box5-12.scad>
use <s/004659as01.scad>
function ldraw_lib__004659a() = [
// 0 Sticker  1 x  1 Fire Emblem
// 0 Name: 004659a.dat
// 0 Author: Alex Taylor [anathema]
// 0 !LDRAW_ORG Part UPDATE 2013-01
// 0 !LICENSE Licensed under CC BY 4.0 : see CAreadme.txt
// 
// 0 BFC CERTIFY CCW
  [0,"BFC","CERTIFY"],
  [0,"BFC","CCW"],
// 
// 0 !HISTORY 2013-03-17 [MagFors] Used box primitive
// 0 !HISTORY 2013-07-21 [PTadmin] Official Update 2013-01
// 
// 
// 1 16 0 -0.25 0 1 0 0 0 1 0 0 0 1 s\004659as01.dat
  [1,16,0,-0.25,0,1,0,0,0,1,0,0,0,1, ldraw_lib__s__004659as01()],
// 1 16 0 -0.25 0 10 0 0 0 0.25 0 0 0 10 box5-12.dat
  [1,16,0,-0.25,0,10,0,0,0,0.25,0,0,0,10, ldraw_lib__box5_12()],
];
module ldraw_lib__004659a(step=0, col=false, unit=2/5, alt=false, line=0.2, solid=!$preview)
    makepoly(ldraw_lib__004659a(), step=step, col=col, unit=unit, alt=alt, line=line, solid=solid);
ldraw_lib__004659a(line=0.2);
// file: 3004.scad
use <../lib.scad>
use <s/3004s01.scad>
function ldraw_lib__3004() = [
// 0 Brick  1 x  2
// 0 Name: 3004.dat
// 0 Author: James Jessiman
// 0 !LDRAW_ORG Part UPDATE 2022-05
// 0 !LICENSE Licensed under CC BY 2.0 and CC BY 4.0 : see CAreadme.txt
// 
// 0 BFC CERTIFY CCW
  [0,"BFC","CERTIFY"],
  [0,"BFC","CCW"],
// 
// 0 !HISTORY 2001-10-26 [PTadmin] Official Update 2001-01
// 0 !HISTORY 2002-05-07 {unknown} BFC Certification
// 0 !HISTORY 2002-06-11 [PTadmin] Official Update 2002-03
// 0 !HISTORY 2007-05-07 [PTadmin] Header formatted for Contributor Agreement
// 0 !HISTORY 2008-07-01 [PTadmin] Official Update 2008-01
// 0 !HISTORY 2022-08-04 [MagFors] Using subfile
// 0 !HISTORY 2022-09-15 [PTadmin] Official Update 2022-05
// 
// 
// 1 16 0 0 0 1 0 0 0 1 0 0 0 1 s\3004s01.dat
  [1,16,0,0,0,1,0,0,0,1,0,0,0,1, ldraw_lib__s__3004s01()],
// 4 16 -20 24 -10 20 24 -10 20 0 -10 -20 0 -10
  [4,16,-20,24,-10,20,24,-10,20,0,-10,-20,0,-10],
];
module ldraw_lib__3004(step=0, col=false, unit=2/5, alt=false, line=0.2, solid=!$preview)
    makepoly(ldraw_lib__3004(), step=step, col=col, unit=unit, alt=alt, line=line, solid=solid);
ldraw_lib__3004(line=0.2);
// file: 004608b.scad
use <../lib.scad>
use <004659a.scad>
function ldraw_lib__004608b() = [
// 0 =Sticker  1 x  1 Fire Emblem
// 0 Name: 004608b.dat
// 0 Author: [PTadmin]
// 0 !LDRAW_ORG Part Alias UPDATE 2013-02
// 0 !LICENSE Licensed under CC BY 4.0 : see CAreadme.txt
// 
// 0 BFC CERTIFY CW
  [0,"BFC","CERTIFY"],
  [0,"BFC","CW"],
// 
// 0 !HISTORY 2013-07-21 [PTadmin] Official Update 2013-01
// 0 !HISTORY 2013-12-14 [cwdee] Add = prefix
// 0 !HISTORY 2013-12-23 [PTadmin] Official Update 2013-02
// 
// 
// 0 // Alias of 004659a
// 
// 1 16 0 0 0 1 0 0 0 1 0 0 0 1 004659a.dat
  [1,16,0,0,0,1,0,0,0,1,0,0,0,1, ldraw_lib__004659a()],
// 0
];
module ldraw_lib__004608b(step=0, col=false, unit=2/5, alt=false, line=0.2, solid=!$preview)
    makepoly(ldraw_lib__004608b(), step=step, col=col, unit=unit, alt=alt, line=line, solid=solid);
ldraw_lib__004608b(line=0.2);
// main file
use <../lib.scad>
use <004608b.scad>
use <3004.scad>
function ldraw_lib__3004d0d() = [
// 0 Brick  1 x  2 with Fire Logo Right Sticker
// 0 Name: 3004d0d.dat
// 0 Author: Takeshi Takahashi [RainbowDolphin]
// 0 !LDRAW_ORG Shortcut UPDATE 2024-04
// 0 !LICENSE Licensed under CC BY 4.0 : see CAreadme.txt
// 
// 0 BFC CERTIFY CCW
  [0,"BFC","CERTIFY"],
  [0,"BFC","CCW"],
// 
// 0 !CATEGORY Sticker Shortcut
// 0 !KEYWORDS Bricklink 3004pb170R, Fire engine, Set 672-1
// 
// 0 !HISTORY 2024-05-28 [OrionP] Official Update 2024-04
// 
// 1 16 0 0 0 1 0 0 0 1 0 0 0 1 3004.dat
  [1,16,0,0,0,1,0,0,0,1,0,0,0,1, ldraw_lib__3004()],
// 1 16 8 12 -10 1 0 0 0 0 -1 0 1 0 004608b.dat
  [1,16,8,12,-10,1,0,0,0,0,-1,0,1,0, ldraw_lib__004608b()],
];
module ldraw_lib__3004d0d(step=0, col=false, unit=2/5, alt=false, line=0.2, solid=!$preview)
    makepoly(ldraw_lib__3004d0d(), step=step, col=col, unit=unit, alt=alt, line=line, solid=solid);
ldraw_lib__3004d0d(line=0.2);
